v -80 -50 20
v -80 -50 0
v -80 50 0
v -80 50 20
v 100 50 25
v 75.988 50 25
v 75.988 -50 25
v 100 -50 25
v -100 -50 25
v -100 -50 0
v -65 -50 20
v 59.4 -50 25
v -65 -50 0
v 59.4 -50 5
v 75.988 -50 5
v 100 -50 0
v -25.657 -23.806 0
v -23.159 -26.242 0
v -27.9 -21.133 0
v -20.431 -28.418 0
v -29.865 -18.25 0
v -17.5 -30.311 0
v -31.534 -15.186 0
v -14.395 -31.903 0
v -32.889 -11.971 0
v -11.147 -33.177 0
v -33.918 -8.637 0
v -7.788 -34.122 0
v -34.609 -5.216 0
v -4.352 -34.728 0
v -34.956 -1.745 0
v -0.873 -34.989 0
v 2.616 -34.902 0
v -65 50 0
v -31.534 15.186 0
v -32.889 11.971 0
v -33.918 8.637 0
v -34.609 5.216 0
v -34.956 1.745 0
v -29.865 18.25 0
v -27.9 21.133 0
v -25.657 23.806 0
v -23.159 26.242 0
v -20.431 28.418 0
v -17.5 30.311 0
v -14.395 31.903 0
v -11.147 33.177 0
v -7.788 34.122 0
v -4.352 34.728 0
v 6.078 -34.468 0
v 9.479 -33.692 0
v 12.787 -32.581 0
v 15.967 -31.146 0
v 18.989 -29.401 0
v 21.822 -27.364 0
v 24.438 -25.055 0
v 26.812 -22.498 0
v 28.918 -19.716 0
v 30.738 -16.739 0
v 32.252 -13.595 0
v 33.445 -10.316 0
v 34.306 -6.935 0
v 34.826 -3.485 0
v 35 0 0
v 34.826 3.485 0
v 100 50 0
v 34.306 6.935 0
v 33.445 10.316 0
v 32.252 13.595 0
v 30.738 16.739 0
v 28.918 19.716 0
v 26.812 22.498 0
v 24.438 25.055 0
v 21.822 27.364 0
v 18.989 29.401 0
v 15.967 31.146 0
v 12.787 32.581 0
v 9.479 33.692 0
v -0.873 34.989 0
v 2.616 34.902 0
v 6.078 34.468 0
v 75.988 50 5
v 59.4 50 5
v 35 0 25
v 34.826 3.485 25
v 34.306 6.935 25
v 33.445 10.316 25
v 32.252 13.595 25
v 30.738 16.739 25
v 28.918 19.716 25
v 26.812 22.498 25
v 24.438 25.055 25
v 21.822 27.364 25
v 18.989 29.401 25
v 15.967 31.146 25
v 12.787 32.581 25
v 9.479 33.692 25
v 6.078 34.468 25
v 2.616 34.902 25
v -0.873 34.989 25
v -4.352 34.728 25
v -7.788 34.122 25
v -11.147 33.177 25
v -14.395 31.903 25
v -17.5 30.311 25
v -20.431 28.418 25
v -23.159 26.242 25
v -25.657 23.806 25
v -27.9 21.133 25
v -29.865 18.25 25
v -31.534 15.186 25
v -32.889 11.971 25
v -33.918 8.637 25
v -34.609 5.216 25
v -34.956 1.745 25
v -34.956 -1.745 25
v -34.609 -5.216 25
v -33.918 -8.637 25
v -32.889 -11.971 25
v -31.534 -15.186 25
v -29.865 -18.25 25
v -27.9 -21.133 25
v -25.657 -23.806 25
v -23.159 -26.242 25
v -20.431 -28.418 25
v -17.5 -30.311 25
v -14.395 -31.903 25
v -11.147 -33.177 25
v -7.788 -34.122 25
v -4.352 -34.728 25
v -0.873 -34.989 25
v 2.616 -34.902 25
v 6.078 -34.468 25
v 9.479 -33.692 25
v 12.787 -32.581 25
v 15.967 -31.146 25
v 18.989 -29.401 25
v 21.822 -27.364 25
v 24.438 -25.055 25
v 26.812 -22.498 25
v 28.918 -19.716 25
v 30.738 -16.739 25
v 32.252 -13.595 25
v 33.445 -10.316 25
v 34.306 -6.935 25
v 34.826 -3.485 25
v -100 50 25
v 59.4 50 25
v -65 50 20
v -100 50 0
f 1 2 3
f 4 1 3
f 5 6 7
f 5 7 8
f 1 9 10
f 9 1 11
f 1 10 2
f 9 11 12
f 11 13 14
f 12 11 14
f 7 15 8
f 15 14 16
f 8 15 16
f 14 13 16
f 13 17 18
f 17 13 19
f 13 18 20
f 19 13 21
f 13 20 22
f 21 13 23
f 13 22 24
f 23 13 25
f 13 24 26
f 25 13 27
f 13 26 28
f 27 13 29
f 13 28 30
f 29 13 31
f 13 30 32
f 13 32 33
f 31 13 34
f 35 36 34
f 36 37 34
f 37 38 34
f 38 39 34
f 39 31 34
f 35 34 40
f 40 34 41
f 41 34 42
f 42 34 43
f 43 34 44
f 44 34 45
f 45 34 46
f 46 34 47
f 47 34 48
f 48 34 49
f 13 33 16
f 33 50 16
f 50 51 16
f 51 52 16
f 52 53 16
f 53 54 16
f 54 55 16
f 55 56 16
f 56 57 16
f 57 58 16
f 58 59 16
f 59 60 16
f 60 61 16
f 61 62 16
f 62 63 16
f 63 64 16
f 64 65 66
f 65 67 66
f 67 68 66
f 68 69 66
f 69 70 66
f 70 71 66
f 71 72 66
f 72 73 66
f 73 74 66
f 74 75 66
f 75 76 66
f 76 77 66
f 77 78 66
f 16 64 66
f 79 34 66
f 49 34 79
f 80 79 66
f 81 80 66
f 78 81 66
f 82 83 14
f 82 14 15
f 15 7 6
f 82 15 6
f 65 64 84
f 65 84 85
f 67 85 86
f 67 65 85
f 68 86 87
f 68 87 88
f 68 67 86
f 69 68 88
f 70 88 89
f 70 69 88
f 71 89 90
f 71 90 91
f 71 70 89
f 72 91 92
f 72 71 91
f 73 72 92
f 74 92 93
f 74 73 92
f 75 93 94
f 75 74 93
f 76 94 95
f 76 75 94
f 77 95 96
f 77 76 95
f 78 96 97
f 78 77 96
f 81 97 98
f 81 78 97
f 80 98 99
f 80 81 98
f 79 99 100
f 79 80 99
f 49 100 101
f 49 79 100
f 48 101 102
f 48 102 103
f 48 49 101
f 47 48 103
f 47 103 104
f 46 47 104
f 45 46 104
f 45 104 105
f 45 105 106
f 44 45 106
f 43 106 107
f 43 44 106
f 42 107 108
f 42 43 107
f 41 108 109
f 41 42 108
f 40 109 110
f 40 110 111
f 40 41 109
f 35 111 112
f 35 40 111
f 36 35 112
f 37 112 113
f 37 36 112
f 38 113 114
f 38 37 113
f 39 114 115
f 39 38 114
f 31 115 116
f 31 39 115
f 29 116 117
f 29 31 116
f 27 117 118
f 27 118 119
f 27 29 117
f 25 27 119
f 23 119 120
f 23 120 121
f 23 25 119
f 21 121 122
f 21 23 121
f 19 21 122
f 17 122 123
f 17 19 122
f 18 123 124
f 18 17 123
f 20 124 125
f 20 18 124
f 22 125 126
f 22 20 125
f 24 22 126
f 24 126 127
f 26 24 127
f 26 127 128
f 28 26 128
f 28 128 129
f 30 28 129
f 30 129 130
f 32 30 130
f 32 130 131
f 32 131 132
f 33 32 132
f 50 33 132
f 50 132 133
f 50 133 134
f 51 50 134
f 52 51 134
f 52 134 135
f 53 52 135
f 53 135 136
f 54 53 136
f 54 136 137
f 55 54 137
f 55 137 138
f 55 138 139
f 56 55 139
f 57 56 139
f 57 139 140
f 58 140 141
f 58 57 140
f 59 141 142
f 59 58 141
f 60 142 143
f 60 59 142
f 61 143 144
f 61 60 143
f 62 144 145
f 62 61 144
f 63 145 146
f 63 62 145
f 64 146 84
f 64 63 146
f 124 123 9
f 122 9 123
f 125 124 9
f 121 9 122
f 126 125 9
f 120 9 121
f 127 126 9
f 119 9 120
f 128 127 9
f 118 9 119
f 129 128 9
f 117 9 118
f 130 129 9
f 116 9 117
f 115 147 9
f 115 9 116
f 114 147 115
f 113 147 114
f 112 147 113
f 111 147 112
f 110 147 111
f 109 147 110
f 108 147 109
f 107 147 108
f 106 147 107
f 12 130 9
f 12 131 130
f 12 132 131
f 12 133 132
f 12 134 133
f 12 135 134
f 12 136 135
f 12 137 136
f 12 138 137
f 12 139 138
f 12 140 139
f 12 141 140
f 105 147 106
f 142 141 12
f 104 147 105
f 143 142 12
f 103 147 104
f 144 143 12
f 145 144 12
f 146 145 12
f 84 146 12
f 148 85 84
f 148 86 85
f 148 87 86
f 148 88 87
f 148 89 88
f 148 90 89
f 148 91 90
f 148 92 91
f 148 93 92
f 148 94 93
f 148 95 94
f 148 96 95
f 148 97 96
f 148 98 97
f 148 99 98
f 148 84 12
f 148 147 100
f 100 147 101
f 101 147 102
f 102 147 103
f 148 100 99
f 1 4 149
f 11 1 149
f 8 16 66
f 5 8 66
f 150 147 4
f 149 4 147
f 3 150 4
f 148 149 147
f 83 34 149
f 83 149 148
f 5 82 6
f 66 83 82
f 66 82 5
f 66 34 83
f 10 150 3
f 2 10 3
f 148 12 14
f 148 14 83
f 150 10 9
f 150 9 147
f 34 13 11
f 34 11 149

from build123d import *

# Parameters (mm, degrees)
F0_W     = 200
F0_H     = 100
F0_R     = 35
F1_DEPTH = 25
F3_W     = 16.588136
F3_H     = 100
F4_DEPTH = 20
F2_W     = 15
F2_H     = 103.238912
F5_DEPTH = 20


with BuildPart() as f1:
    # F0 (on Top) → F1 (new body)
    with BuildSketch(Plane.XY):
        Rectangle(F0_W, F0_H)
        Circle(F0_R, mode=Mode.SUBTRACT)
    extrude(amount=F1_DEPTH)

    # F3 (on face) → F4 (cut)
    with BuildSketch(Plane.XY.offset(25)):
        with Locations((67.693889, 0)):
            Rectangle(F3_W, F3_H)
    extrude(amount=-F4_DEPTH, mode=Mode.SUBTRACT)

    # F2 (on Top) → F5 (cut)
    with BuildSketch(Plane.XY):
        with Locations((-72.5, 0.087306)):
            Rectangle(F2_W, F2_H)
    extrude(amount=F5_DEPTH, mode=Mode.SUBTRACT)


solid = f1.part
